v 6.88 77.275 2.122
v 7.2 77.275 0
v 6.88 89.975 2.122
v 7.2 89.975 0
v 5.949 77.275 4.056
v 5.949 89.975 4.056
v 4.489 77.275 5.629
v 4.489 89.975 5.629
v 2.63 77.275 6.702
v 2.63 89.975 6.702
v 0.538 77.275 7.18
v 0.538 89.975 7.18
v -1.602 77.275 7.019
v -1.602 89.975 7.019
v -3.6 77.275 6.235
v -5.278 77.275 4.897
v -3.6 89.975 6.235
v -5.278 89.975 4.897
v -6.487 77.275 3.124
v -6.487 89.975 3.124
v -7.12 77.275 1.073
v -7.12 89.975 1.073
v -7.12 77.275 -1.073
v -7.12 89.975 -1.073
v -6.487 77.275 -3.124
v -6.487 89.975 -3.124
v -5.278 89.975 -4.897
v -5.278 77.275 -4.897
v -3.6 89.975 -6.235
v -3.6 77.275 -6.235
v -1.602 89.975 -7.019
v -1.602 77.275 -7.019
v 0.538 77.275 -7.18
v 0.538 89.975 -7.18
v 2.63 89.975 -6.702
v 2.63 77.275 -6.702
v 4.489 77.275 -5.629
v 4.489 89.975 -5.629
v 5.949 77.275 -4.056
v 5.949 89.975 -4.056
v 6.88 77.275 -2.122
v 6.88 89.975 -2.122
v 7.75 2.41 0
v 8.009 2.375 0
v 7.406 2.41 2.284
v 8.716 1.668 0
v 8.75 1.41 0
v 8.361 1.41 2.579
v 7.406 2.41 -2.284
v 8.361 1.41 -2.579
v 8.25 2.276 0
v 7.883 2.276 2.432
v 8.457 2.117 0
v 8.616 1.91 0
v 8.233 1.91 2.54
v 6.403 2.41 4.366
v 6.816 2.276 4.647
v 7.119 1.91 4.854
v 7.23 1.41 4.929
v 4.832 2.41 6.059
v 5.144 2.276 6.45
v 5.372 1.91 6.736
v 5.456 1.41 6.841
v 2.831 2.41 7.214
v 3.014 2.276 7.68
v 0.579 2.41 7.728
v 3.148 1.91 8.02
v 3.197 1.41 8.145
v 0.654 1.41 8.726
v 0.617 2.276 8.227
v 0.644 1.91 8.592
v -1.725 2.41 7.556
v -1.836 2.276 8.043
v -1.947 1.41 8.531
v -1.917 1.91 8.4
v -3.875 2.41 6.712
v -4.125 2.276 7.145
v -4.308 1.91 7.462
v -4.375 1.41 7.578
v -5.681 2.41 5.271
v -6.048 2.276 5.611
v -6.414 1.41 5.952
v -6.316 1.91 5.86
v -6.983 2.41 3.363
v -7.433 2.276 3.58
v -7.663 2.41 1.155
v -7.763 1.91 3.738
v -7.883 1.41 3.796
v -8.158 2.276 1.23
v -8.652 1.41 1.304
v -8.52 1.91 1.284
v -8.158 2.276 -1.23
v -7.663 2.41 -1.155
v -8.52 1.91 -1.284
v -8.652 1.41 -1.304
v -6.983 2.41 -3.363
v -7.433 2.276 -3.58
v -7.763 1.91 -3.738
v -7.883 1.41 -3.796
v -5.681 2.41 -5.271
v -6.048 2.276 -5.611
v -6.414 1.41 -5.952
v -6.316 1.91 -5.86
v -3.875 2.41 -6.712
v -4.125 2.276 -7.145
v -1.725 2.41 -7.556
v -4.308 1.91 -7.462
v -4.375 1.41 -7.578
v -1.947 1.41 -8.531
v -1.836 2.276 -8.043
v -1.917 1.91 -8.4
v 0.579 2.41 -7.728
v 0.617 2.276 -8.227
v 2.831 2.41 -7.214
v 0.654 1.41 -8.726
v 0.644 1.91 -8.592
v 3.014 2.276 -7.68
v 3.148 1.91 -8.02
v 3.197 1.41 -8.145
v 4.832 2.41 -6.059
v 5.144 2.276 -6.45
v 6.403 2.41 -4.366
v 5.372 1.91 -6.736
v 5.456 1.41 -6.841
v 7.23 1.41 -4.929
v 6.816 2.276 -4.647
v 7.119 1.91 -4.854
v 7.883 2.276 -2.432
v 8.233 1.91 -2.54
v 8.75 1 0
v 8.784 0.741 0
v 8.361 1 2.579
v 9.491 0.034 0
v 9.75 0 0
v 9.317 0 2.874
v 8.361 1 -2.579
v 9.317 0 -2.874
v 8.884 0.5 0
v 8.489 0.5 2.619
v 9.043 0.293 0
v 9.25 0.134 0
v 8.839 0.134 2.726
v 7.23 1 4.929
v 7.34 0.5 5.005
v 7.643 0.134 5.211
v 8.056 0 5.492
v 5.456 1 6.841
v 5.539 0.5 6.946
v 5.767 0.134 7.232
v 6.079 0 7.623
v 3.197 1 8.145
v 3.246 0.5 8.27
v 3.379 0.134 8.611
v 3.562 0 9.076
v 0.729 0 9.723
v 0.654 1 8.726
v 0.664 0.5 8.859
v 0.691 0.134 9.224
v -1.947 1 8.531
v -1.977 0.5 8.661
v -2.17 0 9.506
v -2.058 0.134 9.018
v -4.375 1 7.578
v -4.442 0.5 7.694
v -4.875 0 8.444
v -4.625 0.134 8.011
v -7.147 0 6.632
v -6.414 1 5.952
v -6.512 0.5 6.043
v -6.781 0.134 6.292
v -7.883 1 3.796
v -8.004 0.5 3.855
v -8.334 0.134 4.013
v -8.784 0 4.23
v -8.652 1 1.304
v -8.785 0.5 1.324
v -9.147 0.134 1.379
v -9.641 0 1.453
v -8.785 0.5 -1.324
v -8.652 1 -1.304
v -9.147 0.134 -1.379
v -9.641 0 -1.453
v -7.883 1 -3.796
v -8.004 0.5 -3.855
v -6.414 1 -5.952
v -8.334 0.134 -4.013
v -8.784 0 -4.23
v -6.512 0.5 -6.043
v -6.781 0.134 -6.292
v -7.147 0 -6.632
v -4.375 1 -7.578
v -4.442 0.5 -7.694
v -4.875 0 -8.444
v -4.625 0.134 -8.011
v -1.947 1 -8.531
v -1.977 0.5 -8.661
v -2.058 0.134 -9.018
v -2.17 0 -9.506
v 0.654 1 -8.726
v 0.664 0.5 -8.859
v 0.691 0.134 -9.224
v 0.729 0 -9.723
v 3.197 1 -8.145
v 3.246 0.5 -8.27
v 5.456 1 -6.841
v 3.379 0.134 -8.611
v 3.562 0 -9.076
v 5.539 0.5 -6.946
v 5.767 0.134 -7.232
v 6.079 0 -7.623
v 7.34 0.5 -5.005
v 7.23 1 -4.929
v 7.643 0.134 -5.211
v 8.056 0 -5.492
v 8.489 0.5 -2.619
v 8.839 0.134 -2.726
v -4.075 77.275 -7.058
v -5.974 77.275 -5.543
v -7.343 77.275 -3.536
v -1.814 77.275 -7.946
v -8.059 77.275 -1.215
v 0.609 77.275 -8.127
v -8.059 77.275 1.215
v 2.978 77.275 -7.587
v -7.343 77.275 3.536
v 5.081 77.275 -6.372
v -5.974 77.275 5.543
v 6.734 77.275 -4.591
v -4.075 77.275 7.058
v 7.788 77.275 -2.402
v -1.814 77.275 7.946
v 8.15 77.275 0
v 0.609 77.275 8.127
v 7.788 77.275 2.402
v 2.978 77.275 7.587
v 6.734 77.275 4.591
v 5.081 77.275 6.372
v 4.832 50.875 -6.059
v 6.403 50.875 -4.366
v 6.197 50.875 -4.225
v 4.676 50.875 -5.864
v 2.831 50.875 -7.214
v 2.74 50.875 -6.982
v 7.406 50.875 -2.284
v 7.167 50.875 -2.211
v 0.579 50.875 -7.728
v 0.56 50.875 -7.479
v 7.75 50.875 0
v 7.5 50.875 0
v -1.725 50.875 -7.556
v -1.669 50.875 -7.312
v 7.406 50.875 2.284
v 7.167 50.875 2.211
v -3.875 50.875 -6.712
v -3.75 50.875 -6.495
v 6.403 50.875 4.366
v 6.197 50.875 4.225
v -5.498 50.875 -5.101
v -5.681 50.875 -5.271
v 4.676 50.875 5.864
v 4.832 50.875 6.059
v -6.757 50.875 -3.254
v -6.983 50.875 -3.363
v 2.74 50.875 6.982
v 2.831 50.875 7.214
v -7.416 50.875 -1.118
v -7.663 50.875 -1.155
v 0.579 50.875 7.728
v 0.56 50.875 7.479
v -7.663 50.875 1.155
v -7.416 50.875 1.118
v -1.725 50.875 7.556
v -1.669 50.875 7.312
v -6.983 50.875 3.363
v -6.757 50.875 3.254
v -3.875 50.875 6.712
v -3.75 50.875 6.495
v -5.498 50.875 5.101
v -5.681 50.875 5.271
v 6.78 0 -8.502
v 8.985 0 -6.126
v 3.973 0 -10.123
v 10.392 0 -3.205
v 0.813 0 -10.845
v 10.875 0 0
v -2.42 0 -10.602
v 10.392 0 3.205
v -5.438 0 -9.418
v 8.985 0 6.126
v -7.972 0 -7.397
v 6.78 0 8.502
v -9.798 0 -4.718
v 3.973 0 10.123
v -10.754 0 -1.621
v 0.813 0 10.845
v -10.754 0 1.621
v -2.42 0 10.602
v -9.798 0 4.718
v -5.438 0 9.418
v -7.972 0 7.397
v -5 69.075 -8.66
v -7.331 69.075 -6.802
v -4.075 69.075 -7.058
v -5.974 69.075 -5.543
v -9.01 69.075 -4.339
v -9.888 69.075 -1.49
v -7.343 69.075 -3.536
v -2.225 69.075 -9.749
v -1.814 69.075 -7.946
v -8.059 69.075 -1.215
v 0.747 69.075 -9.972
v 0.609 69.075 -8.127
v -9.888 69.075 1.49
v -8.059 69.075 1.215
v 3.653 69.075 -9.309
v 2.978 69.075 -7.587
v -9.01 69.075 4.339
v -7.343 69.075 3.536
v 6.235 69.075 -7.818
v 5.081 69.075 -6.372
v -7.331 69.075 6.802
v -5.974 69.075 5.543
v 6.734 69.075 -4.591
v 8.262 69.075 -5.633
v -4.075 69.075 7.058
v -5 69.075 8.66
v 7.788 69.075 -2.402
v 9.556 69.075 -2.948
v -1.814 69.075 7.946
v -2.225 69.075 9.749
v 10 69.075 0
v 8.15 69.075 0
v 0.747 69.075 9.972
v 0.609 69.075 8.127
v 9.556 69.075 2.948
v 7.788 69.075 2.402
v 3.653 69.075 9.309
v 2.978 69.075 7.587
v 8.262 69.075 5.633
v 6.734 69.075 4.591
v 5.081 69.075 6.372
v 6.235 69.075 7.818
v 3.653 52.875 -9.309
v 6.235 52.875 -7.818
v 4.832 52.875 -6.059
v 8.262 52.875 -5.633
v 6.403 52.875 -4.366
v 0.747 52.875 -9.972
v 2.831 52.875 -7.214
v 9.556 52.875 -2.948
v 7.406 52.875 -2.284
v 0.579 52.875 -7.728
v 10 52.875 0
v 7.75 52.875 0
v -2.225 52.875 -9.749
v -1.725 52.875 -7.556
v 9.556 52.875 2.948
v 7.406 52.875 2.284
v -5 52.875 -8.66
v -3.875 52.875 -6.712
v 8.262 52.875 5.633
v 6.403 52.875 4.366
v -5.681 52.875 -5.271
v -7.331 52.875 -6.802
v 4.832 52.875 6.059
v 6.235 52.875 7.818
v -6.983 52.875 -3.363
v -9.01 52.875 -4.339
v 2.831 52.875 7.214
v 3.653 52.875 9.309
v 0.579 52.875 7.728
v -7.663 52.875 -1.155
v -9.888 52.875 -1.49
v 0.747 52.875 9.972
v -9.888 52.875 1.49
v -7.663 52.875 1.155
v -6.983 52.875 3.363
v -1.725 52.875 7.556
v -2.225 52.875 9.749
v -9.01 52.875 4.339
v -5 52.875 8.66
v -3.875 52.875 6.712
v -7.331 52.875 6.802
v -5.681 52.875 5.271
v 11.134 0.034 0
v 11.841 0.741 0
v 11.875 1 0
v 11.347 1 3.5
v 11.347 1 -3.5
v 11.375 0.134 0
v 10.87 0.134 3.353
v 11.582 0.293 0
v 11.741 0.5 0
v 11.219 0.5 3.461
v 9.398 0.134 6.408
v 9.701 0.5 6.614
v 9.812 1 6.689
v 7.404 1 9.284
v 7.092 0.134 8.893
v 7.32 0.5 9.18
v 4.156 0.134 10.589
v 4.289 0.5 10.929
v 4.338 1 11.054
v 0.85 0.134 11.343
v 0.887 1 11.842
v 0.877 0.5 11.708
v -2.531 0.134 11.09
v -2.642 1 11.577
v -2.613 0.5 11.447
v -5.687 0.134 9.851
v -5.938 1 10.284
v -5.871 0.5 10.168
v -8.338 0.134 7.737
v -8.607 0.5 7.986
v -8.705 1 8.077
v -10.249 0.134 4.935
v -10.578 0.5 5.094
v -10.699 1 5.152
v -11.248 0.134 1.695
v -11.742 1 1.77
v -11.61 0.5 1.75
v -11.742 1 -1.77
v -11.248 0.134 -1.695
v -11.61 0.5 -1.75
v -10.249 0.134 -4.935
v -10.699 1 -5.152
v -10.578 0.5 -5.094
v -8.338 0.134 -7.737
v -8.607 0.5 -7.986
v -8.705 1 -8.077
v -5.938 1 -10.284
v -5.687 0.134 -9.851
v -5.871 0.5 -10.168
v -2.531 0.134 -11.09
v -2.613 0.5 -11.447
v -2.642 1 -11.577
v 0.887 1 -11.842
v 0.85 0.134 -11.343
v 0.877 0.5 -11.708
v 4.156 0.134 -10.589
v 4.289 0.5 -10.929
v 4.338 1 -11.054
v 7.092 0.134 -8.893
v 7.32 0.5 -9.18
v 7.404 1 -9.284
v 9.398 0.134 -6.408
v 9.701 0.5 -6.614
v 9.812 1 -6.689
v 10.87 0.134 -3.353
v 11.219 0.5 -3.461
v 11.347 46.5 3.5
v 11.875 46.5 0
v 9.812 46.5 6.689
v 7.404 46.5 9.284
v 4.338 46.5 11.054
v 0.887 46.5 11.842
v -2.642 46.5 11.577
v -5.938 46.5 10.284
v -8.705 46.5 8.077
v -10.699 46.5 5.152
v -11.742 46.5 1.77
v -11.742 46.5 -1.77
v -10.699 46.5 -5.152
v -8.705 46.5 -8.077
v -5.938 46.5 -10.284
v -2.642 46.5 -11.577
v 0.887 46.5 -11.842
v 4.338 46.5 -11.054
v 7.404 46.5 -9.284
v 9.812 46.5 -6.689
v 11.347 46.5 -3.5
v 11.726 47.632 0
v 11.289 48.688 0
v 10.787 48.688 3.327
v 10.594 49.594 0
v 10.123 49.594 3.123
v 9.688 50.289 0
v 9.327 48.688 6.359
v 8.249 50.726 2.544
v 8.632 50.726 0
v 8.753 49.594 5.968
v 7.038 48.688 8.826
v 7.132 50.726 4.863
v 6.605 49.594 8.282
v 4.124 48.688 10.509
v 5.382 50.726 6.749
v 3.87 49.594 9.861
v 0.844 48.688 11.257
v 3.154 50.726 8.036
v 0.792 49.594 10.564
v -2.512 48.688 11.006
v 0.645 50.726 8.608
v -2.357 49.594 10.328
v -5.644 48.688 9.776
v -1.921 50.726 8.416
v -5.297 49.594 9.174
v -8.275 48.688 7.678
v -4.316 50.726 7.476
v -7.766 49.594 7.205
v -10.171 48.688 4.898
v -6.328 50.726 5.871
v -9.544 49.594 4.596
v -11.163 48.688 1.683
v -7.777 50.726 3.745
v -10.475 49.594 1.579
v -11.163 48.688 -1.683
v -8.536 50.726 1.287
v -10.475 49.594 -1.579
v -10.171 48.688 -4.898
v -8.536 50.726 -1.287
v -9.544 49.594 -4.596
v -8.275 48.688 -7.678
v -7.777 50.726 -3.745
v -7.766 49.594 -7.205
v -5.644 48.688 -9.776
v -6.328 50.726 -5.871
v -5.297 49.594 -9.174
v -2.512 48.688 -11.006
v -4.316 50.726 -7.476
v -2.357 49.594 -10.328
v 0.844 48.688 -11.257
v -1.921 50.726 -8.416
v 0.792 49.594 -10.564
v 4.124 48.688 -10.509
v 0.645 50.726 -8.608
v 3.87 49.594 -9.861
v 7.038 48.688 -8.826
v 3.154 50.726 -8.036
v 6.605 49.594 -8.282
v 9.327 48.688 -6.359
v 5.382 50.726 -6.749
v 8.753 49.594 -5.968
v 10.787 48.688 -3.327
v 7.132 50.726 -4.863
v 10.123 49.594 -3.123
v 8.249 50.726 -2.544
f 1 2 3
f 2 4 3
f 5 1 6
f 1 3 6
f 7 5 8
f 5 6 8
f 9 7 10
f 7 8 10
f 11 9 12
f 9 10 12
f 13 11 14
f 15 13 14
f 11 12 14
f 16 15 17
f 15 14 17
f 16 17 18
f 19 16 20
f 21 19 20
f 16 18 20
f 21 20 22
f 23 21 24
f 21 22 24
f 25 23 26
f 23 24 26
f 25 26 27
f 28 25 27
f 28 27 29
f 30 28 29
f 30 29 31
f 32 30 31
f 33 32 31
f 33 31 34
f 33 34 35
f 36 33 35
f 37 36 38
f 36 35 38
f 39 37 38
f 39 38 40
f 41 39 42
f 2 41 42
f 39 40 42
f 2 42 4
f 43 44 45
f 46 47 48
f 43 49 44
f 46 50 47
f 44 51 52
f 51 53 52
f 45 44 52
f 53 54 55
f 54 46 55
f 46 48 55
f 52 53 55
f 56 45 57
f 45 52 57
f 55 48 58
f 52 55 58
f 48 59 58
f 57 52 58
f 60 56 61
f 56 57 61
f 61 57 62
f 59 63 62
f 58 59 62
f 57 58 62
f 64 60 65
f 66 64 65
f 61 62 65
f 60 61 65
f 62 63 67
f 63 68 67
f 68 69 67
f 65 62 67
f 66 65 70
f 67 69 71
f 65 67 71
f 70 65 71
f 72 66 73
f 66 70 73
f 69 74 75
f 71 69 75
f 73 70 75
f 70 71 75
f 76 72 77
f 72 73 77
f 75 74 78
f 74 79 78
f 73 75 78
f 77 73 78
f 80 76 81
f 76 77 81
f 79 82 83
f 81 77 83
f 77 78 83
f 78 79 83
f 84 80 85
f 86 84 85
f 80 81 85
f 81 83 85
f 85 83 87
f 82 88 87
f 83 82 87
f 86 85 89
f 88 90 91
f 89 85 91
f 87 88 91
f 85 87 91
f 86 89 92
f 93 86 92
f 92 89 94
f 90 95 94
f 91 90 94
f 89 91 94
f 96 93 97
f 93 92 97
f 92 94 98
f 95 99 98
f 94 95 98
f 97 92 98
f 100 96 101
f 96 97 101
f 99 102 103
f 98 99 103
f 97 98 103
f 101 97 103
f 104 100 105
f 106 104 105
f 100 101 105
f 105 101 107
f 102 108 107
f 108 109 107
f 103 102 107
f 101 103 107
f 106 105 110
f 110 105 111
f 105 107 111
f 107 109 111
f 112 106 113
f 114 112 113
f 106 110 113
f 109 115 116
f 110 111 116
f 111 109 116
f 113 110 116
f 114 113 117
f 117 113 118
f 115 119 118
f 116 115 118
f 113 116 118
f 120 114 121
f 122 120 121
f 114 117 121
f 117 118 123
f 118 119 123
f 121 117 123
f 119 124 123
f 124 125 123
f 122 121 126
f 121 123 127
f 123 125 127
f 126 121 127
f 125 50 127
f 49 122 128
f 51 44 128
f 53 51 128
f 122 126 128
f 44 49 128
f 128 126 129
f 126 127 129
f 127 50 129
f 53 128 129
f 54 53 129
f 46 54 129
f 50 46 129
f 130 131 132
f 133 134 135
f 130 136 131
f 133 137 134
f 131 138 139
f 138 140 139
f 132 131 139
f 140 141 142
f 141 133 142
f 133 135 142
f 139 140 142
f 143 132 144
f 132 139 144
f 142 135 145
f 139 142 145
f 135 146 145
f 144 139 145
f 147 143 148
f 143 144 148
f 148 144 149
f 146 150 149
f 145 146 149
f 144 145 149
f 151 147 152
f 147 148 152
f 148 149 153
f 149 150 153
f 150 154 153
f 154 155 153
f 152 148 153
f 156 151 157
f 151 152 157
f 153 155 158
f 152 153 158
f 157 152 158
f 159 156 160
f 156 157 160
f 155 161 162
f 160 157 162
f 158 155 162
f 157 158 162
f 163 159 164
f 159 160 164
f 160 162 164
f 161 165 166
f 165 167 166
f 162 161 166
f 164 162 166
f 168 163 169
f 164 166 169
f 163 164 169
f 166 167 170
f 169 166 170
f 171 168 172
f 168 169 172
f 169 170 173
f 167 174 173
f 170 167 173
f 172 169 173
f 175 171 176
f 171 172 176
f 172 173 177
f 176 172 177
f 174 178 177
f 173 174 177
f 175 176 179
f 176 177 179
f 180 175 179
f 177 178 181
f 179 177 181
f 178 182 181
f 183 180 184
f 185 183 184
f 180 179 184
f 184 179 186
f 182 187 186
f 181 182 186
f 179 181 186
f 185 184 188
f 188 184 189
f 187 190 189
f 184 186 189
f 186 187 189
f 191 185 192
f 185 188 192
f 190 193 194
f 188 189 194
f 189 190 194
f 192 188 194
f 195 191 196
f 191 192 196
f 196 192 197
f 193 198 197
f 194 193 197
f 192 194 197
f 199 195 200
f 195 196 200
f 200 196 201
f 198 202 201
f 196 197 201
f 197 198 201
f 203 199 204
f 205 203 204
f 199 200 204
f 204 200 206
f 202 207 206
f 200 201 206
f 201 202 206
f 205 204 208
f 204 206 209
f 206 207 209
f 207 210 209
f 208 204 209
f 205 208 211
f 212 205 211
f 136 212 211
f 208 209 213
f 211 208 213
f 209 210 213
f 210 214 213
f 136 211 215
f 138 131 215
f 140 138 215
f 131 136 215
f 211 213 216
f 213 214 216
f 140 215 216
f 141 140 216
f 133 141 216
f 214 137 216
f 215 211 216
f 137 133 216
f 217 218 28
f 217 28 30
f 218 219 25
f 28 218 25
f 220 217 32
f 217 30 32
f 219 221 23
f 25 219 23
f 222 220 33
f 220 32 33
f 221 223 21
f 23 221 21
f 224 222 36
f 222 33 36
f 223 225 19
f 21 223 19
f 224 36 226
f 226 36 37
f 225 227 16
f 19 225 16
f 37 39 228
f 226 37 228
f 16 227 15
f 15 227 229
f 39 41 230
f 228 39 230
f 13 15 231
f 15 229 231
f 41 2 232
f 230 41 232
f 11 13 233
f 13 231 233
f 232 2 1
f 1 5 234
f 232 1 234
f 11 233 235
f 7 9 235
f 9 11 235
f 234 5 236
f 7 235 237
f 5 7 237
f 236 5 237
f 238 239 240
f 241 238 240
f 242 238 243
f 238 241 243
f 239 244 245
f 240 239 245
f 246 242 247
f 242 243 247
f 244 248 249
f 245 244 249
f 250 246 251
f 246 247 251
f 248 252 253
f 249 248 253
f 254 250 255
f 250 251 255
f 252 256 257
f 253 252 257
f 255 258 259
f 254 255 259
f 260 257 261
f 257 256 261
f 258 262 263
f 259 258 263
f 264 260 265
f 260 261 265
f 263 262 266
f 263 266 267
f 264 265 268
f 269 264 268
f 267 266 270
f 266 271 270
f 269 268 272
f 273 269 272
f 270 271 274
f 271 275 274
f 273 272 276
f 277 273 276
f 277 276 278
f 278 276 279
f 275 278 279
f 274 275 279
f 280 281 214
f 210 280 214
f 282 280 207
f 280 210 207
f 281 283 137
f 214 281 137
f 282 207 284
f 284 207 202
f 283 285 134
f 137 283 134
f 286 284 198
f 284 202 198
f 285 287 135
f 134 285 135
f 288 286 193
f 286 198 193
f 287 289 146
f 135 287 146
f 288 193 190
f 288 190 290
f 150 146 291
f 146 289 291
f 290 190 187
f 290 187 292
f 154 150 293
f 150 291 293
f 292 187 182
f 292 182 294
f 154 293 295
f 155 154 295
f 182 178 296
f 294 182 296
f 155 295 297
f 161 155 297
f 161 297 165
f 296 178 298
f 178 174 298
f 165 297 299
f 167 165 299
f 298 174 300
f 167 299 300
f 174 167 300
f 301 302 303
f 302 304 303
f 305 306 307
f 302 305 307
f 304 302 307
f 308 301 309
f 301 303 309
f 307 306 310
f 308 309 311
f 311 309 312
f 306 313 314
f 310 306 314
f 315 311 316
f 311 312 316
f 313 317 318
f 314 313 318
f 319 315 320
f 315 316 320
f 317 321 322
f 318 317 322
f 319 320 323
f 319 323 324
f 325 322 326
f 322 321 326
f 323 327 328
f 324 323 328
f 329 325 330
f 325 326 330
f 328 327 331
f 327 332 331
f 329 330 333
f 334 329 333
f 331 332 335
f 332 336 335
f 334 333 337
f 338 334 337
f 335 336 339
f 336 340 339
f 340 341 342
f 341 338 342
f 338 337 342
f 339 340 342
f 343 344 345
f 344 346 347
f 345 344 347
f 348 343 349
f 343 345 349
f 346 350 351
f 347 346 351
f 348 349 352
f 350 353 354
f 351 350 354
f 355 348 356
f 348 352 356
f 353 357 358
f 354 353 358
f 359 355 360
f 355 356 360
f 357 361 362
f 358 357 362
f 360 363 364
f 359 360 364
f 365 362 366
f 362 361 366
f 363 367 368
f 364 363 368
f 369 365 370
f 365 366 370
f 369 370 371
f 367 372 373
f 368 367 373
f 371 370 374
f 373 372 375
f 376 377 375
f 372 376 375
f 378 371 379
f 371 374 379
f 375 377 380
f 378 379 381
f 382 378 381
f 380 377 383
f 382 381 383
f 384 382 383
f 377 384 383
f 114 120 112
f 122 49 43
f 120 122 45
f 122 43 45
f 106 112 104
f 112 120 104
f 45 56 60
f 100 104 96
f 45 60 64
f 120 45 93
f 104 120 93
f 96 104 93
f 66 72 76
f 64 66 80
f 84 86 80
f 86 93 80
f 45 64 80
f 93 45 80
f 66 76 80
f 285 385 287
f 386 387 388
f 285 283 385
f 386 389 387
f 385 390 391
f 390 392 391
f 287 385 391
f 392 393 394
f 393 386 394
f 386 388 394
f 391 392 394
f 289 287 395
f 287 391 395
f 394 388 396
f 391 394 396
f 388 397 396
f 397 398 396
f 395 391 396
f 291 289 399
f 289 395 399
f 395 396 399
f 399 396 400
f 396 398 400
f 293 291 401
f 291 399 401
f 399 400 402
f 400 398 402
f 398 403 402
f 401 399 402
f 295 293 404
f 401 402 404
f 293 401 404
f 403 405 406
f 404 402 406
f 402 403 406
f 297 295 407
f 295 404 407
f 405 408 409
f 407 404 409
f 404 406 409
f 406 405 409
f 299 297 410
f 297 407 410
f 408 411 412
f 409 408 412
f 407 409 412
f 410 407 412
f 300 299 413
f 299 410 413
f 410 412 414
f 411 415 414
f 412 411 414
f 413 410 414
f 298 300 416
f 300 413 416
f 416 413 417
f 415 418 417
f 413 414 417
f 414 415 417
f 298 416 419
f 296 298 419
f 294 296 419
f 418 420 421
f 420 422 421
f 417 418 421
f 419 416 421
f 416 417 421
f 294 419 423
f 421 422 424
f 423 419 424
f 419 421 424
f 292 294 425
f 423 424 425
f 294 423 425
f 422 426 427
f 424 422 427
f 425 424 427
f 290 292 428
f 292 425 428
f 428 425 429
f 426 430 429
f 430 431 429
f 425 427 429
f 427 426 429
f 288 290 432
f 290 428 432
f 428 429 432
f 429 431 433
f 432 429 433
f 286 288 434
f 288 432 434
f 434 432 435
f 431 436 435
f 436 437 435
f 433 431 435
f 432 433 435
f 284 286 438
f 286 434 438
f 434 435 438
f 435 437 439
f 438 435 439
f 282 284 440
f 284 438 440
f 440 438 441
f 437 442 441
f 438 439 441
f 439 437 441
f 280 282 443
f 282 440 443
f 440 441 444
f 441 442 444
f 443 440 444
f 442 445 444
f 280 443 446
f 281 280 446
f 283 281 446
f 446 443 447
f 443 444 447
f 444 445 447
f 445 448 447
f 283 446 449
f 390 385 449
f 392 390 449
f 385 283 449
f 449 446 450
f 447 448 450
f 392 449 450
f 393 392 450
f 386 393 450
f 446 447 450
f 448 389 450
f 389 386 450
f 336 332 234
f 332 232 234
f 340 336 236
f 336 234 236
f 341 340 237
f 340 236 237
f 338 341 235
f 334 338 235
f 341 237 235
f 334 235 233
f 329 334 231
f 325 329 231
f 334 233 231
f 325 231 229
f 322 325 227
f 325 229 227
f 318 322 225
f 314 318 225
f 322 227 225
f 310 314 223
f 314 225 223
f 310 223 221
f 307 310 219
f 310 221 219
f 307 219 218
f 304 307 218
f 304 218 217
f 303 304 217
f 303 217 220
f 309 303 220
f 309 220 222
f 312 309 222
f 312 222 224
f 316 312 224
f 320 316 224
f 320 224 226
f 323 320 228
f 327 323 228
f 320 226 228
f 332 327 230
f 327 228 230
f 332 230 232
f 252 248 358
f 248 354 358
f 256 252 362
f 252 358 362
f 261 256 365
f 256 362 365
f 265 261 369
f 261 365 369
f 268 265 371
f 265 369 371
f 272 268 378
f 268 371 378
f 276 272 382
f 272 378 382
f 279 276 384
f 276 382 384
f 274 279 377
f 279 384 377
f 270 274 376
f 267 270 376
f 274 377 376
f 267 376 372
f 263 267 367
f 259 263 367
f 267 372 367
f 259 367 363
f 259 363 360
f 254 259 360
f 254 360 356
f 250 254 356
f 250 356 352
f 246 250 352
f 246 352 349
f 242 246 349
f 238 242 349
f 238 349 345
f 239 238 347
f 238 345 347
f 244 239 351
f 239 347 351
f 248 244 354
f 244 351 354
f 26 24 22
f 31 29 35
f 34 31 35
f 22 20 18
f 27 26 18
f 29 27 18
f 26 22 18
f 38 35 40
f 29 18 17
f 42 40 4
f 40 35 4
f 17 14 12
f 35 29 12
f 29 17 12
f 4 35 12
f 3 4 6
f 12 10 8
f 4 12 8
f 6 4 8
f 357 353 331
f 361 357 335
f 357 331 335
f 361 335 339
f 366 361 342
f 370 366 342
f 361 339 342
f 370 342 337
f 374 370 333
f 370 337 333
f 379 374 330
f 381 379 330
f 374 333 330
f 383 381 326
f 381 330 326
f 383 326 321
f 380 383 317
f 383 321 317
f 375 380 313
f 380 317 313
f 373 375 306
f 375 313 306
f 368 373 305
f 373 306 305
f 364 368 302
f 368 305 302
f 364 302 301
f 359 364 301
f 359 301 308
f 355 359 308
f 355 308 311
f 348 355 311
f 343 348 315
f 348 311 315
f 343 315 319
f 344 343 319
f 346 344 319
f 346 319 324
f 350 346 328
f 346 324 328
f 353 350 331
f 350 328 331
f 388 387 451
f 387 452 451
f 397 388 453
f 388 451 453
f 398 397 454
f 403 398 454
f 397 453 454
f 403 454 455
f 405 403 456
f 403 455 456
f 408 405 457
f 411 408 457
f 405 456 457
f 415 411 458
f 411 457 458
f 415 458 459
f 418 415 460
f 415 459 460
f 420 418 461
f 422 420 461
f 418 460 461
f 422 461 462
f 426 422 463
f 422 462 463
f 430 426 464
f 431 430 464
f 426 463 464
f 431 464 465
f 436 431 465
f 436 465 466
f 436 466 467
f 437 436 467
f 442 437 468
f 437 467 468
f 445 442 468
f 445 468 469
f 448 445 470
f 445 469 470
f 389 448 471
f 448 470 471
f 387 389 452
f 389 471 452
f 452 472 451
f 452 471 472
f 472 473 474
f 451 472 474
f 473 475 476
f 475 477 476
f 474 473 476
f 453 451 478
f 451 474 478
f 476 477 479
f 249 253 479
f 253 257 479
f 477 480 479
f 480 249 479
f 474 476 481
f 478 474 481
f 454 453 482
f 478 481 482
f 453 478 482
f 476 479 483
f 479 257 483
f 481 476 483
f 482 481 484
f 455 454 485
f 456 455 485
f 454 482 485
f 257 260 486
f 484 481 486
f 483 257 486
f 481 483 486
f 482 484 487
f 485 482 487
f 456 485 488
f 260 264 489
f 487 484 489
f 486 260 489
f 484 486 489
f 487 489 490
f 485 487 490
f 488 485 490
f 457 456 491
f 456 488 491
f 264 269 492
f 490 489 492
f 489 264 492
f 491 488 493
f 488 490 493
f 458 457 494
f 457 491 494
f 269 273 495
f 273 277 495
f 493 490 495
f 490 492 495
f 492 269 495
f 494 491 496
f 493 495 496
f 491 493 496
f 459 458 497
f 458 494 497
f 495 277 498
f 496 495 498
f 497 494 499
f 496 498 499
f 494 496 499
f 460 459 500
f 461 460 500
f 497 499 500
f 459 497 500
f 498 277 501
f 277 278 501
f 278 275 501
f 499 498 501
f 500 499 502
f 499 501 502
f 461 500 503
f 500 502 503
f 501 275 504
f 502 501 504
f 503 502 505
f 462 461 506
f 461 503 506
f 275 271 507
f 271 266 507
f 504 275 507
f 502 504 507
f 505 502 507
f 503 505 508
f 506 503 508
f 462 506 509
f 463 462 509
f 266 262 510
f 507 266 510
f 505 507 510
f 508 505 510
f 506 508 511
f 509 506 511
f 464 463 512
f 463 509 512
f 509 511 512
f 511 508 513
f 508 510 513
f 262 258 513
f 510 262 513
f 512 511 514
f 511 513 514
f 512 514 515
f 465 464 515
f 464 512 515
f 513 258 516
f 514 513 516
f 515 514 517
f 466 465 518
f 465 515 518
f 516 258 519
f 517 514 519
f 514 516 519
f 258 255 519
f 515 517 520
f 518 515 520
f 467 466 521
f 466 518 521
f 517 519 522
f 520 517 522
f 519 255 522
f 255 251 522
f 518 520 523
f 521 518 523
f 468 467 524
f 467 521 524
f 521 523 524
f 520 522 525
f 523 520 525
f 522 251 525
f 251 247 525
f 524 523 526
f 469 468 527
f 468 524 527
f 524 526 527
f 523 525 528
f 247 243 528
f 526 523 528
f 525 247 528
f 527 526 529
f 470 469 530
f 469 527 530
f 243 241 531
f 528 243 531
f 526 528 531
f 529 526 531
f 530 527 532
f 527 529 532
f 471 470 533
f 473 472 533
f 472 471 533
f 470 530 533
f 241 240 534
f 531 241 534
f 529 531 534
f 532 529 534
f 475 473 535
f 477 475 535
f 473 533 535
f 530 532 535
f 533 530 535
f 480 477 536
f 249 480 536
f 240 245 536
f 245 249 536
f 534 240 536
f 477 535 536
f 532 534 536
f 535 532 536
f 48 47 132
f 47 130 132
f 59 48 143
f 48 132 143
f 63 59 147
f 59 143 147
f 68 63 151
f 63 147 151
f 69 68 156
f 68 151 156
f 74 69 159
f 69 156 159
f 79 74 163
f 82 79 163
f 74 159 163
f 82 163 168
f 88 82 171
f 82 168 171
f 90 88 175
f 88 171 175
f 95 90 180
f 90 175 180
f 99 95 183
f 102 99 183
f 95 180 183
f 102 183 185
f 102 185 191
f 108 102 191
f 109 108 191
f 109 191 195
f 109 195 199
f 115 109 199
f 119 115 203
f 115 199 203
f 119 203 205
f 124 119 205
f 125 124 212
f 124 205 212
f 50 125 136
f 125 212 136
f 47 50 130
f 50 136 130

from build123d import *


with BuildPart() as part:
    # Sketch1 → Revolve1 (revolve)
    with BuildSketch(Plane.XY):
        with BuildLine():
            Line((9.75, 0), (10.875, 0))
            ThreePointArc((10.875, 0), (11.582106781, 0.292893219), (11.875, 1))
            Line((11.875, 1), (11.875, 46.5))
            ThreePointArc((11.875, 46.5), (10.593592168, 49.593592168), (7.5, 50.875))
            Line((7.5, 50.875), (7.75, 50.875))
            Line((7.75, 50.875), (7.75, 52.875))
            Line((7.75, 52.875), (10, 52.875))
            Line((10, 52.875), (10, 69.075))
            Line((10, 69.075), (8.15, 69.075))
            Line((8.15, 69.075), (8.15, 77.275))
            Line((8.15, 77.275), (7.2, 77.275))
            Line((7.2, 77.275), (7.2, 89.975))
            Line((7.2, 89.975), (0, 89.975))
            Line((0, 89.975), (0, 65.8))
            Line((0, 65.8), (0, 2.409558552))
            Line((0, 2.409558552), (7.75, 2.409558552))
            ThreePointArc((7.75, 2.409558552), (8.457106781, 2.116665333), (8.75, 1.409558552))
            Line((8.75, 1.409558552), (8.75, 1))
            ThreePointArc((8.75, 1), (9.042893219, 0.292893219), (9.75, 0))
        make_face()
    revolve(axis=Axis((0, 65.8, 0), (0, -1, 0)))


solid = part.part
